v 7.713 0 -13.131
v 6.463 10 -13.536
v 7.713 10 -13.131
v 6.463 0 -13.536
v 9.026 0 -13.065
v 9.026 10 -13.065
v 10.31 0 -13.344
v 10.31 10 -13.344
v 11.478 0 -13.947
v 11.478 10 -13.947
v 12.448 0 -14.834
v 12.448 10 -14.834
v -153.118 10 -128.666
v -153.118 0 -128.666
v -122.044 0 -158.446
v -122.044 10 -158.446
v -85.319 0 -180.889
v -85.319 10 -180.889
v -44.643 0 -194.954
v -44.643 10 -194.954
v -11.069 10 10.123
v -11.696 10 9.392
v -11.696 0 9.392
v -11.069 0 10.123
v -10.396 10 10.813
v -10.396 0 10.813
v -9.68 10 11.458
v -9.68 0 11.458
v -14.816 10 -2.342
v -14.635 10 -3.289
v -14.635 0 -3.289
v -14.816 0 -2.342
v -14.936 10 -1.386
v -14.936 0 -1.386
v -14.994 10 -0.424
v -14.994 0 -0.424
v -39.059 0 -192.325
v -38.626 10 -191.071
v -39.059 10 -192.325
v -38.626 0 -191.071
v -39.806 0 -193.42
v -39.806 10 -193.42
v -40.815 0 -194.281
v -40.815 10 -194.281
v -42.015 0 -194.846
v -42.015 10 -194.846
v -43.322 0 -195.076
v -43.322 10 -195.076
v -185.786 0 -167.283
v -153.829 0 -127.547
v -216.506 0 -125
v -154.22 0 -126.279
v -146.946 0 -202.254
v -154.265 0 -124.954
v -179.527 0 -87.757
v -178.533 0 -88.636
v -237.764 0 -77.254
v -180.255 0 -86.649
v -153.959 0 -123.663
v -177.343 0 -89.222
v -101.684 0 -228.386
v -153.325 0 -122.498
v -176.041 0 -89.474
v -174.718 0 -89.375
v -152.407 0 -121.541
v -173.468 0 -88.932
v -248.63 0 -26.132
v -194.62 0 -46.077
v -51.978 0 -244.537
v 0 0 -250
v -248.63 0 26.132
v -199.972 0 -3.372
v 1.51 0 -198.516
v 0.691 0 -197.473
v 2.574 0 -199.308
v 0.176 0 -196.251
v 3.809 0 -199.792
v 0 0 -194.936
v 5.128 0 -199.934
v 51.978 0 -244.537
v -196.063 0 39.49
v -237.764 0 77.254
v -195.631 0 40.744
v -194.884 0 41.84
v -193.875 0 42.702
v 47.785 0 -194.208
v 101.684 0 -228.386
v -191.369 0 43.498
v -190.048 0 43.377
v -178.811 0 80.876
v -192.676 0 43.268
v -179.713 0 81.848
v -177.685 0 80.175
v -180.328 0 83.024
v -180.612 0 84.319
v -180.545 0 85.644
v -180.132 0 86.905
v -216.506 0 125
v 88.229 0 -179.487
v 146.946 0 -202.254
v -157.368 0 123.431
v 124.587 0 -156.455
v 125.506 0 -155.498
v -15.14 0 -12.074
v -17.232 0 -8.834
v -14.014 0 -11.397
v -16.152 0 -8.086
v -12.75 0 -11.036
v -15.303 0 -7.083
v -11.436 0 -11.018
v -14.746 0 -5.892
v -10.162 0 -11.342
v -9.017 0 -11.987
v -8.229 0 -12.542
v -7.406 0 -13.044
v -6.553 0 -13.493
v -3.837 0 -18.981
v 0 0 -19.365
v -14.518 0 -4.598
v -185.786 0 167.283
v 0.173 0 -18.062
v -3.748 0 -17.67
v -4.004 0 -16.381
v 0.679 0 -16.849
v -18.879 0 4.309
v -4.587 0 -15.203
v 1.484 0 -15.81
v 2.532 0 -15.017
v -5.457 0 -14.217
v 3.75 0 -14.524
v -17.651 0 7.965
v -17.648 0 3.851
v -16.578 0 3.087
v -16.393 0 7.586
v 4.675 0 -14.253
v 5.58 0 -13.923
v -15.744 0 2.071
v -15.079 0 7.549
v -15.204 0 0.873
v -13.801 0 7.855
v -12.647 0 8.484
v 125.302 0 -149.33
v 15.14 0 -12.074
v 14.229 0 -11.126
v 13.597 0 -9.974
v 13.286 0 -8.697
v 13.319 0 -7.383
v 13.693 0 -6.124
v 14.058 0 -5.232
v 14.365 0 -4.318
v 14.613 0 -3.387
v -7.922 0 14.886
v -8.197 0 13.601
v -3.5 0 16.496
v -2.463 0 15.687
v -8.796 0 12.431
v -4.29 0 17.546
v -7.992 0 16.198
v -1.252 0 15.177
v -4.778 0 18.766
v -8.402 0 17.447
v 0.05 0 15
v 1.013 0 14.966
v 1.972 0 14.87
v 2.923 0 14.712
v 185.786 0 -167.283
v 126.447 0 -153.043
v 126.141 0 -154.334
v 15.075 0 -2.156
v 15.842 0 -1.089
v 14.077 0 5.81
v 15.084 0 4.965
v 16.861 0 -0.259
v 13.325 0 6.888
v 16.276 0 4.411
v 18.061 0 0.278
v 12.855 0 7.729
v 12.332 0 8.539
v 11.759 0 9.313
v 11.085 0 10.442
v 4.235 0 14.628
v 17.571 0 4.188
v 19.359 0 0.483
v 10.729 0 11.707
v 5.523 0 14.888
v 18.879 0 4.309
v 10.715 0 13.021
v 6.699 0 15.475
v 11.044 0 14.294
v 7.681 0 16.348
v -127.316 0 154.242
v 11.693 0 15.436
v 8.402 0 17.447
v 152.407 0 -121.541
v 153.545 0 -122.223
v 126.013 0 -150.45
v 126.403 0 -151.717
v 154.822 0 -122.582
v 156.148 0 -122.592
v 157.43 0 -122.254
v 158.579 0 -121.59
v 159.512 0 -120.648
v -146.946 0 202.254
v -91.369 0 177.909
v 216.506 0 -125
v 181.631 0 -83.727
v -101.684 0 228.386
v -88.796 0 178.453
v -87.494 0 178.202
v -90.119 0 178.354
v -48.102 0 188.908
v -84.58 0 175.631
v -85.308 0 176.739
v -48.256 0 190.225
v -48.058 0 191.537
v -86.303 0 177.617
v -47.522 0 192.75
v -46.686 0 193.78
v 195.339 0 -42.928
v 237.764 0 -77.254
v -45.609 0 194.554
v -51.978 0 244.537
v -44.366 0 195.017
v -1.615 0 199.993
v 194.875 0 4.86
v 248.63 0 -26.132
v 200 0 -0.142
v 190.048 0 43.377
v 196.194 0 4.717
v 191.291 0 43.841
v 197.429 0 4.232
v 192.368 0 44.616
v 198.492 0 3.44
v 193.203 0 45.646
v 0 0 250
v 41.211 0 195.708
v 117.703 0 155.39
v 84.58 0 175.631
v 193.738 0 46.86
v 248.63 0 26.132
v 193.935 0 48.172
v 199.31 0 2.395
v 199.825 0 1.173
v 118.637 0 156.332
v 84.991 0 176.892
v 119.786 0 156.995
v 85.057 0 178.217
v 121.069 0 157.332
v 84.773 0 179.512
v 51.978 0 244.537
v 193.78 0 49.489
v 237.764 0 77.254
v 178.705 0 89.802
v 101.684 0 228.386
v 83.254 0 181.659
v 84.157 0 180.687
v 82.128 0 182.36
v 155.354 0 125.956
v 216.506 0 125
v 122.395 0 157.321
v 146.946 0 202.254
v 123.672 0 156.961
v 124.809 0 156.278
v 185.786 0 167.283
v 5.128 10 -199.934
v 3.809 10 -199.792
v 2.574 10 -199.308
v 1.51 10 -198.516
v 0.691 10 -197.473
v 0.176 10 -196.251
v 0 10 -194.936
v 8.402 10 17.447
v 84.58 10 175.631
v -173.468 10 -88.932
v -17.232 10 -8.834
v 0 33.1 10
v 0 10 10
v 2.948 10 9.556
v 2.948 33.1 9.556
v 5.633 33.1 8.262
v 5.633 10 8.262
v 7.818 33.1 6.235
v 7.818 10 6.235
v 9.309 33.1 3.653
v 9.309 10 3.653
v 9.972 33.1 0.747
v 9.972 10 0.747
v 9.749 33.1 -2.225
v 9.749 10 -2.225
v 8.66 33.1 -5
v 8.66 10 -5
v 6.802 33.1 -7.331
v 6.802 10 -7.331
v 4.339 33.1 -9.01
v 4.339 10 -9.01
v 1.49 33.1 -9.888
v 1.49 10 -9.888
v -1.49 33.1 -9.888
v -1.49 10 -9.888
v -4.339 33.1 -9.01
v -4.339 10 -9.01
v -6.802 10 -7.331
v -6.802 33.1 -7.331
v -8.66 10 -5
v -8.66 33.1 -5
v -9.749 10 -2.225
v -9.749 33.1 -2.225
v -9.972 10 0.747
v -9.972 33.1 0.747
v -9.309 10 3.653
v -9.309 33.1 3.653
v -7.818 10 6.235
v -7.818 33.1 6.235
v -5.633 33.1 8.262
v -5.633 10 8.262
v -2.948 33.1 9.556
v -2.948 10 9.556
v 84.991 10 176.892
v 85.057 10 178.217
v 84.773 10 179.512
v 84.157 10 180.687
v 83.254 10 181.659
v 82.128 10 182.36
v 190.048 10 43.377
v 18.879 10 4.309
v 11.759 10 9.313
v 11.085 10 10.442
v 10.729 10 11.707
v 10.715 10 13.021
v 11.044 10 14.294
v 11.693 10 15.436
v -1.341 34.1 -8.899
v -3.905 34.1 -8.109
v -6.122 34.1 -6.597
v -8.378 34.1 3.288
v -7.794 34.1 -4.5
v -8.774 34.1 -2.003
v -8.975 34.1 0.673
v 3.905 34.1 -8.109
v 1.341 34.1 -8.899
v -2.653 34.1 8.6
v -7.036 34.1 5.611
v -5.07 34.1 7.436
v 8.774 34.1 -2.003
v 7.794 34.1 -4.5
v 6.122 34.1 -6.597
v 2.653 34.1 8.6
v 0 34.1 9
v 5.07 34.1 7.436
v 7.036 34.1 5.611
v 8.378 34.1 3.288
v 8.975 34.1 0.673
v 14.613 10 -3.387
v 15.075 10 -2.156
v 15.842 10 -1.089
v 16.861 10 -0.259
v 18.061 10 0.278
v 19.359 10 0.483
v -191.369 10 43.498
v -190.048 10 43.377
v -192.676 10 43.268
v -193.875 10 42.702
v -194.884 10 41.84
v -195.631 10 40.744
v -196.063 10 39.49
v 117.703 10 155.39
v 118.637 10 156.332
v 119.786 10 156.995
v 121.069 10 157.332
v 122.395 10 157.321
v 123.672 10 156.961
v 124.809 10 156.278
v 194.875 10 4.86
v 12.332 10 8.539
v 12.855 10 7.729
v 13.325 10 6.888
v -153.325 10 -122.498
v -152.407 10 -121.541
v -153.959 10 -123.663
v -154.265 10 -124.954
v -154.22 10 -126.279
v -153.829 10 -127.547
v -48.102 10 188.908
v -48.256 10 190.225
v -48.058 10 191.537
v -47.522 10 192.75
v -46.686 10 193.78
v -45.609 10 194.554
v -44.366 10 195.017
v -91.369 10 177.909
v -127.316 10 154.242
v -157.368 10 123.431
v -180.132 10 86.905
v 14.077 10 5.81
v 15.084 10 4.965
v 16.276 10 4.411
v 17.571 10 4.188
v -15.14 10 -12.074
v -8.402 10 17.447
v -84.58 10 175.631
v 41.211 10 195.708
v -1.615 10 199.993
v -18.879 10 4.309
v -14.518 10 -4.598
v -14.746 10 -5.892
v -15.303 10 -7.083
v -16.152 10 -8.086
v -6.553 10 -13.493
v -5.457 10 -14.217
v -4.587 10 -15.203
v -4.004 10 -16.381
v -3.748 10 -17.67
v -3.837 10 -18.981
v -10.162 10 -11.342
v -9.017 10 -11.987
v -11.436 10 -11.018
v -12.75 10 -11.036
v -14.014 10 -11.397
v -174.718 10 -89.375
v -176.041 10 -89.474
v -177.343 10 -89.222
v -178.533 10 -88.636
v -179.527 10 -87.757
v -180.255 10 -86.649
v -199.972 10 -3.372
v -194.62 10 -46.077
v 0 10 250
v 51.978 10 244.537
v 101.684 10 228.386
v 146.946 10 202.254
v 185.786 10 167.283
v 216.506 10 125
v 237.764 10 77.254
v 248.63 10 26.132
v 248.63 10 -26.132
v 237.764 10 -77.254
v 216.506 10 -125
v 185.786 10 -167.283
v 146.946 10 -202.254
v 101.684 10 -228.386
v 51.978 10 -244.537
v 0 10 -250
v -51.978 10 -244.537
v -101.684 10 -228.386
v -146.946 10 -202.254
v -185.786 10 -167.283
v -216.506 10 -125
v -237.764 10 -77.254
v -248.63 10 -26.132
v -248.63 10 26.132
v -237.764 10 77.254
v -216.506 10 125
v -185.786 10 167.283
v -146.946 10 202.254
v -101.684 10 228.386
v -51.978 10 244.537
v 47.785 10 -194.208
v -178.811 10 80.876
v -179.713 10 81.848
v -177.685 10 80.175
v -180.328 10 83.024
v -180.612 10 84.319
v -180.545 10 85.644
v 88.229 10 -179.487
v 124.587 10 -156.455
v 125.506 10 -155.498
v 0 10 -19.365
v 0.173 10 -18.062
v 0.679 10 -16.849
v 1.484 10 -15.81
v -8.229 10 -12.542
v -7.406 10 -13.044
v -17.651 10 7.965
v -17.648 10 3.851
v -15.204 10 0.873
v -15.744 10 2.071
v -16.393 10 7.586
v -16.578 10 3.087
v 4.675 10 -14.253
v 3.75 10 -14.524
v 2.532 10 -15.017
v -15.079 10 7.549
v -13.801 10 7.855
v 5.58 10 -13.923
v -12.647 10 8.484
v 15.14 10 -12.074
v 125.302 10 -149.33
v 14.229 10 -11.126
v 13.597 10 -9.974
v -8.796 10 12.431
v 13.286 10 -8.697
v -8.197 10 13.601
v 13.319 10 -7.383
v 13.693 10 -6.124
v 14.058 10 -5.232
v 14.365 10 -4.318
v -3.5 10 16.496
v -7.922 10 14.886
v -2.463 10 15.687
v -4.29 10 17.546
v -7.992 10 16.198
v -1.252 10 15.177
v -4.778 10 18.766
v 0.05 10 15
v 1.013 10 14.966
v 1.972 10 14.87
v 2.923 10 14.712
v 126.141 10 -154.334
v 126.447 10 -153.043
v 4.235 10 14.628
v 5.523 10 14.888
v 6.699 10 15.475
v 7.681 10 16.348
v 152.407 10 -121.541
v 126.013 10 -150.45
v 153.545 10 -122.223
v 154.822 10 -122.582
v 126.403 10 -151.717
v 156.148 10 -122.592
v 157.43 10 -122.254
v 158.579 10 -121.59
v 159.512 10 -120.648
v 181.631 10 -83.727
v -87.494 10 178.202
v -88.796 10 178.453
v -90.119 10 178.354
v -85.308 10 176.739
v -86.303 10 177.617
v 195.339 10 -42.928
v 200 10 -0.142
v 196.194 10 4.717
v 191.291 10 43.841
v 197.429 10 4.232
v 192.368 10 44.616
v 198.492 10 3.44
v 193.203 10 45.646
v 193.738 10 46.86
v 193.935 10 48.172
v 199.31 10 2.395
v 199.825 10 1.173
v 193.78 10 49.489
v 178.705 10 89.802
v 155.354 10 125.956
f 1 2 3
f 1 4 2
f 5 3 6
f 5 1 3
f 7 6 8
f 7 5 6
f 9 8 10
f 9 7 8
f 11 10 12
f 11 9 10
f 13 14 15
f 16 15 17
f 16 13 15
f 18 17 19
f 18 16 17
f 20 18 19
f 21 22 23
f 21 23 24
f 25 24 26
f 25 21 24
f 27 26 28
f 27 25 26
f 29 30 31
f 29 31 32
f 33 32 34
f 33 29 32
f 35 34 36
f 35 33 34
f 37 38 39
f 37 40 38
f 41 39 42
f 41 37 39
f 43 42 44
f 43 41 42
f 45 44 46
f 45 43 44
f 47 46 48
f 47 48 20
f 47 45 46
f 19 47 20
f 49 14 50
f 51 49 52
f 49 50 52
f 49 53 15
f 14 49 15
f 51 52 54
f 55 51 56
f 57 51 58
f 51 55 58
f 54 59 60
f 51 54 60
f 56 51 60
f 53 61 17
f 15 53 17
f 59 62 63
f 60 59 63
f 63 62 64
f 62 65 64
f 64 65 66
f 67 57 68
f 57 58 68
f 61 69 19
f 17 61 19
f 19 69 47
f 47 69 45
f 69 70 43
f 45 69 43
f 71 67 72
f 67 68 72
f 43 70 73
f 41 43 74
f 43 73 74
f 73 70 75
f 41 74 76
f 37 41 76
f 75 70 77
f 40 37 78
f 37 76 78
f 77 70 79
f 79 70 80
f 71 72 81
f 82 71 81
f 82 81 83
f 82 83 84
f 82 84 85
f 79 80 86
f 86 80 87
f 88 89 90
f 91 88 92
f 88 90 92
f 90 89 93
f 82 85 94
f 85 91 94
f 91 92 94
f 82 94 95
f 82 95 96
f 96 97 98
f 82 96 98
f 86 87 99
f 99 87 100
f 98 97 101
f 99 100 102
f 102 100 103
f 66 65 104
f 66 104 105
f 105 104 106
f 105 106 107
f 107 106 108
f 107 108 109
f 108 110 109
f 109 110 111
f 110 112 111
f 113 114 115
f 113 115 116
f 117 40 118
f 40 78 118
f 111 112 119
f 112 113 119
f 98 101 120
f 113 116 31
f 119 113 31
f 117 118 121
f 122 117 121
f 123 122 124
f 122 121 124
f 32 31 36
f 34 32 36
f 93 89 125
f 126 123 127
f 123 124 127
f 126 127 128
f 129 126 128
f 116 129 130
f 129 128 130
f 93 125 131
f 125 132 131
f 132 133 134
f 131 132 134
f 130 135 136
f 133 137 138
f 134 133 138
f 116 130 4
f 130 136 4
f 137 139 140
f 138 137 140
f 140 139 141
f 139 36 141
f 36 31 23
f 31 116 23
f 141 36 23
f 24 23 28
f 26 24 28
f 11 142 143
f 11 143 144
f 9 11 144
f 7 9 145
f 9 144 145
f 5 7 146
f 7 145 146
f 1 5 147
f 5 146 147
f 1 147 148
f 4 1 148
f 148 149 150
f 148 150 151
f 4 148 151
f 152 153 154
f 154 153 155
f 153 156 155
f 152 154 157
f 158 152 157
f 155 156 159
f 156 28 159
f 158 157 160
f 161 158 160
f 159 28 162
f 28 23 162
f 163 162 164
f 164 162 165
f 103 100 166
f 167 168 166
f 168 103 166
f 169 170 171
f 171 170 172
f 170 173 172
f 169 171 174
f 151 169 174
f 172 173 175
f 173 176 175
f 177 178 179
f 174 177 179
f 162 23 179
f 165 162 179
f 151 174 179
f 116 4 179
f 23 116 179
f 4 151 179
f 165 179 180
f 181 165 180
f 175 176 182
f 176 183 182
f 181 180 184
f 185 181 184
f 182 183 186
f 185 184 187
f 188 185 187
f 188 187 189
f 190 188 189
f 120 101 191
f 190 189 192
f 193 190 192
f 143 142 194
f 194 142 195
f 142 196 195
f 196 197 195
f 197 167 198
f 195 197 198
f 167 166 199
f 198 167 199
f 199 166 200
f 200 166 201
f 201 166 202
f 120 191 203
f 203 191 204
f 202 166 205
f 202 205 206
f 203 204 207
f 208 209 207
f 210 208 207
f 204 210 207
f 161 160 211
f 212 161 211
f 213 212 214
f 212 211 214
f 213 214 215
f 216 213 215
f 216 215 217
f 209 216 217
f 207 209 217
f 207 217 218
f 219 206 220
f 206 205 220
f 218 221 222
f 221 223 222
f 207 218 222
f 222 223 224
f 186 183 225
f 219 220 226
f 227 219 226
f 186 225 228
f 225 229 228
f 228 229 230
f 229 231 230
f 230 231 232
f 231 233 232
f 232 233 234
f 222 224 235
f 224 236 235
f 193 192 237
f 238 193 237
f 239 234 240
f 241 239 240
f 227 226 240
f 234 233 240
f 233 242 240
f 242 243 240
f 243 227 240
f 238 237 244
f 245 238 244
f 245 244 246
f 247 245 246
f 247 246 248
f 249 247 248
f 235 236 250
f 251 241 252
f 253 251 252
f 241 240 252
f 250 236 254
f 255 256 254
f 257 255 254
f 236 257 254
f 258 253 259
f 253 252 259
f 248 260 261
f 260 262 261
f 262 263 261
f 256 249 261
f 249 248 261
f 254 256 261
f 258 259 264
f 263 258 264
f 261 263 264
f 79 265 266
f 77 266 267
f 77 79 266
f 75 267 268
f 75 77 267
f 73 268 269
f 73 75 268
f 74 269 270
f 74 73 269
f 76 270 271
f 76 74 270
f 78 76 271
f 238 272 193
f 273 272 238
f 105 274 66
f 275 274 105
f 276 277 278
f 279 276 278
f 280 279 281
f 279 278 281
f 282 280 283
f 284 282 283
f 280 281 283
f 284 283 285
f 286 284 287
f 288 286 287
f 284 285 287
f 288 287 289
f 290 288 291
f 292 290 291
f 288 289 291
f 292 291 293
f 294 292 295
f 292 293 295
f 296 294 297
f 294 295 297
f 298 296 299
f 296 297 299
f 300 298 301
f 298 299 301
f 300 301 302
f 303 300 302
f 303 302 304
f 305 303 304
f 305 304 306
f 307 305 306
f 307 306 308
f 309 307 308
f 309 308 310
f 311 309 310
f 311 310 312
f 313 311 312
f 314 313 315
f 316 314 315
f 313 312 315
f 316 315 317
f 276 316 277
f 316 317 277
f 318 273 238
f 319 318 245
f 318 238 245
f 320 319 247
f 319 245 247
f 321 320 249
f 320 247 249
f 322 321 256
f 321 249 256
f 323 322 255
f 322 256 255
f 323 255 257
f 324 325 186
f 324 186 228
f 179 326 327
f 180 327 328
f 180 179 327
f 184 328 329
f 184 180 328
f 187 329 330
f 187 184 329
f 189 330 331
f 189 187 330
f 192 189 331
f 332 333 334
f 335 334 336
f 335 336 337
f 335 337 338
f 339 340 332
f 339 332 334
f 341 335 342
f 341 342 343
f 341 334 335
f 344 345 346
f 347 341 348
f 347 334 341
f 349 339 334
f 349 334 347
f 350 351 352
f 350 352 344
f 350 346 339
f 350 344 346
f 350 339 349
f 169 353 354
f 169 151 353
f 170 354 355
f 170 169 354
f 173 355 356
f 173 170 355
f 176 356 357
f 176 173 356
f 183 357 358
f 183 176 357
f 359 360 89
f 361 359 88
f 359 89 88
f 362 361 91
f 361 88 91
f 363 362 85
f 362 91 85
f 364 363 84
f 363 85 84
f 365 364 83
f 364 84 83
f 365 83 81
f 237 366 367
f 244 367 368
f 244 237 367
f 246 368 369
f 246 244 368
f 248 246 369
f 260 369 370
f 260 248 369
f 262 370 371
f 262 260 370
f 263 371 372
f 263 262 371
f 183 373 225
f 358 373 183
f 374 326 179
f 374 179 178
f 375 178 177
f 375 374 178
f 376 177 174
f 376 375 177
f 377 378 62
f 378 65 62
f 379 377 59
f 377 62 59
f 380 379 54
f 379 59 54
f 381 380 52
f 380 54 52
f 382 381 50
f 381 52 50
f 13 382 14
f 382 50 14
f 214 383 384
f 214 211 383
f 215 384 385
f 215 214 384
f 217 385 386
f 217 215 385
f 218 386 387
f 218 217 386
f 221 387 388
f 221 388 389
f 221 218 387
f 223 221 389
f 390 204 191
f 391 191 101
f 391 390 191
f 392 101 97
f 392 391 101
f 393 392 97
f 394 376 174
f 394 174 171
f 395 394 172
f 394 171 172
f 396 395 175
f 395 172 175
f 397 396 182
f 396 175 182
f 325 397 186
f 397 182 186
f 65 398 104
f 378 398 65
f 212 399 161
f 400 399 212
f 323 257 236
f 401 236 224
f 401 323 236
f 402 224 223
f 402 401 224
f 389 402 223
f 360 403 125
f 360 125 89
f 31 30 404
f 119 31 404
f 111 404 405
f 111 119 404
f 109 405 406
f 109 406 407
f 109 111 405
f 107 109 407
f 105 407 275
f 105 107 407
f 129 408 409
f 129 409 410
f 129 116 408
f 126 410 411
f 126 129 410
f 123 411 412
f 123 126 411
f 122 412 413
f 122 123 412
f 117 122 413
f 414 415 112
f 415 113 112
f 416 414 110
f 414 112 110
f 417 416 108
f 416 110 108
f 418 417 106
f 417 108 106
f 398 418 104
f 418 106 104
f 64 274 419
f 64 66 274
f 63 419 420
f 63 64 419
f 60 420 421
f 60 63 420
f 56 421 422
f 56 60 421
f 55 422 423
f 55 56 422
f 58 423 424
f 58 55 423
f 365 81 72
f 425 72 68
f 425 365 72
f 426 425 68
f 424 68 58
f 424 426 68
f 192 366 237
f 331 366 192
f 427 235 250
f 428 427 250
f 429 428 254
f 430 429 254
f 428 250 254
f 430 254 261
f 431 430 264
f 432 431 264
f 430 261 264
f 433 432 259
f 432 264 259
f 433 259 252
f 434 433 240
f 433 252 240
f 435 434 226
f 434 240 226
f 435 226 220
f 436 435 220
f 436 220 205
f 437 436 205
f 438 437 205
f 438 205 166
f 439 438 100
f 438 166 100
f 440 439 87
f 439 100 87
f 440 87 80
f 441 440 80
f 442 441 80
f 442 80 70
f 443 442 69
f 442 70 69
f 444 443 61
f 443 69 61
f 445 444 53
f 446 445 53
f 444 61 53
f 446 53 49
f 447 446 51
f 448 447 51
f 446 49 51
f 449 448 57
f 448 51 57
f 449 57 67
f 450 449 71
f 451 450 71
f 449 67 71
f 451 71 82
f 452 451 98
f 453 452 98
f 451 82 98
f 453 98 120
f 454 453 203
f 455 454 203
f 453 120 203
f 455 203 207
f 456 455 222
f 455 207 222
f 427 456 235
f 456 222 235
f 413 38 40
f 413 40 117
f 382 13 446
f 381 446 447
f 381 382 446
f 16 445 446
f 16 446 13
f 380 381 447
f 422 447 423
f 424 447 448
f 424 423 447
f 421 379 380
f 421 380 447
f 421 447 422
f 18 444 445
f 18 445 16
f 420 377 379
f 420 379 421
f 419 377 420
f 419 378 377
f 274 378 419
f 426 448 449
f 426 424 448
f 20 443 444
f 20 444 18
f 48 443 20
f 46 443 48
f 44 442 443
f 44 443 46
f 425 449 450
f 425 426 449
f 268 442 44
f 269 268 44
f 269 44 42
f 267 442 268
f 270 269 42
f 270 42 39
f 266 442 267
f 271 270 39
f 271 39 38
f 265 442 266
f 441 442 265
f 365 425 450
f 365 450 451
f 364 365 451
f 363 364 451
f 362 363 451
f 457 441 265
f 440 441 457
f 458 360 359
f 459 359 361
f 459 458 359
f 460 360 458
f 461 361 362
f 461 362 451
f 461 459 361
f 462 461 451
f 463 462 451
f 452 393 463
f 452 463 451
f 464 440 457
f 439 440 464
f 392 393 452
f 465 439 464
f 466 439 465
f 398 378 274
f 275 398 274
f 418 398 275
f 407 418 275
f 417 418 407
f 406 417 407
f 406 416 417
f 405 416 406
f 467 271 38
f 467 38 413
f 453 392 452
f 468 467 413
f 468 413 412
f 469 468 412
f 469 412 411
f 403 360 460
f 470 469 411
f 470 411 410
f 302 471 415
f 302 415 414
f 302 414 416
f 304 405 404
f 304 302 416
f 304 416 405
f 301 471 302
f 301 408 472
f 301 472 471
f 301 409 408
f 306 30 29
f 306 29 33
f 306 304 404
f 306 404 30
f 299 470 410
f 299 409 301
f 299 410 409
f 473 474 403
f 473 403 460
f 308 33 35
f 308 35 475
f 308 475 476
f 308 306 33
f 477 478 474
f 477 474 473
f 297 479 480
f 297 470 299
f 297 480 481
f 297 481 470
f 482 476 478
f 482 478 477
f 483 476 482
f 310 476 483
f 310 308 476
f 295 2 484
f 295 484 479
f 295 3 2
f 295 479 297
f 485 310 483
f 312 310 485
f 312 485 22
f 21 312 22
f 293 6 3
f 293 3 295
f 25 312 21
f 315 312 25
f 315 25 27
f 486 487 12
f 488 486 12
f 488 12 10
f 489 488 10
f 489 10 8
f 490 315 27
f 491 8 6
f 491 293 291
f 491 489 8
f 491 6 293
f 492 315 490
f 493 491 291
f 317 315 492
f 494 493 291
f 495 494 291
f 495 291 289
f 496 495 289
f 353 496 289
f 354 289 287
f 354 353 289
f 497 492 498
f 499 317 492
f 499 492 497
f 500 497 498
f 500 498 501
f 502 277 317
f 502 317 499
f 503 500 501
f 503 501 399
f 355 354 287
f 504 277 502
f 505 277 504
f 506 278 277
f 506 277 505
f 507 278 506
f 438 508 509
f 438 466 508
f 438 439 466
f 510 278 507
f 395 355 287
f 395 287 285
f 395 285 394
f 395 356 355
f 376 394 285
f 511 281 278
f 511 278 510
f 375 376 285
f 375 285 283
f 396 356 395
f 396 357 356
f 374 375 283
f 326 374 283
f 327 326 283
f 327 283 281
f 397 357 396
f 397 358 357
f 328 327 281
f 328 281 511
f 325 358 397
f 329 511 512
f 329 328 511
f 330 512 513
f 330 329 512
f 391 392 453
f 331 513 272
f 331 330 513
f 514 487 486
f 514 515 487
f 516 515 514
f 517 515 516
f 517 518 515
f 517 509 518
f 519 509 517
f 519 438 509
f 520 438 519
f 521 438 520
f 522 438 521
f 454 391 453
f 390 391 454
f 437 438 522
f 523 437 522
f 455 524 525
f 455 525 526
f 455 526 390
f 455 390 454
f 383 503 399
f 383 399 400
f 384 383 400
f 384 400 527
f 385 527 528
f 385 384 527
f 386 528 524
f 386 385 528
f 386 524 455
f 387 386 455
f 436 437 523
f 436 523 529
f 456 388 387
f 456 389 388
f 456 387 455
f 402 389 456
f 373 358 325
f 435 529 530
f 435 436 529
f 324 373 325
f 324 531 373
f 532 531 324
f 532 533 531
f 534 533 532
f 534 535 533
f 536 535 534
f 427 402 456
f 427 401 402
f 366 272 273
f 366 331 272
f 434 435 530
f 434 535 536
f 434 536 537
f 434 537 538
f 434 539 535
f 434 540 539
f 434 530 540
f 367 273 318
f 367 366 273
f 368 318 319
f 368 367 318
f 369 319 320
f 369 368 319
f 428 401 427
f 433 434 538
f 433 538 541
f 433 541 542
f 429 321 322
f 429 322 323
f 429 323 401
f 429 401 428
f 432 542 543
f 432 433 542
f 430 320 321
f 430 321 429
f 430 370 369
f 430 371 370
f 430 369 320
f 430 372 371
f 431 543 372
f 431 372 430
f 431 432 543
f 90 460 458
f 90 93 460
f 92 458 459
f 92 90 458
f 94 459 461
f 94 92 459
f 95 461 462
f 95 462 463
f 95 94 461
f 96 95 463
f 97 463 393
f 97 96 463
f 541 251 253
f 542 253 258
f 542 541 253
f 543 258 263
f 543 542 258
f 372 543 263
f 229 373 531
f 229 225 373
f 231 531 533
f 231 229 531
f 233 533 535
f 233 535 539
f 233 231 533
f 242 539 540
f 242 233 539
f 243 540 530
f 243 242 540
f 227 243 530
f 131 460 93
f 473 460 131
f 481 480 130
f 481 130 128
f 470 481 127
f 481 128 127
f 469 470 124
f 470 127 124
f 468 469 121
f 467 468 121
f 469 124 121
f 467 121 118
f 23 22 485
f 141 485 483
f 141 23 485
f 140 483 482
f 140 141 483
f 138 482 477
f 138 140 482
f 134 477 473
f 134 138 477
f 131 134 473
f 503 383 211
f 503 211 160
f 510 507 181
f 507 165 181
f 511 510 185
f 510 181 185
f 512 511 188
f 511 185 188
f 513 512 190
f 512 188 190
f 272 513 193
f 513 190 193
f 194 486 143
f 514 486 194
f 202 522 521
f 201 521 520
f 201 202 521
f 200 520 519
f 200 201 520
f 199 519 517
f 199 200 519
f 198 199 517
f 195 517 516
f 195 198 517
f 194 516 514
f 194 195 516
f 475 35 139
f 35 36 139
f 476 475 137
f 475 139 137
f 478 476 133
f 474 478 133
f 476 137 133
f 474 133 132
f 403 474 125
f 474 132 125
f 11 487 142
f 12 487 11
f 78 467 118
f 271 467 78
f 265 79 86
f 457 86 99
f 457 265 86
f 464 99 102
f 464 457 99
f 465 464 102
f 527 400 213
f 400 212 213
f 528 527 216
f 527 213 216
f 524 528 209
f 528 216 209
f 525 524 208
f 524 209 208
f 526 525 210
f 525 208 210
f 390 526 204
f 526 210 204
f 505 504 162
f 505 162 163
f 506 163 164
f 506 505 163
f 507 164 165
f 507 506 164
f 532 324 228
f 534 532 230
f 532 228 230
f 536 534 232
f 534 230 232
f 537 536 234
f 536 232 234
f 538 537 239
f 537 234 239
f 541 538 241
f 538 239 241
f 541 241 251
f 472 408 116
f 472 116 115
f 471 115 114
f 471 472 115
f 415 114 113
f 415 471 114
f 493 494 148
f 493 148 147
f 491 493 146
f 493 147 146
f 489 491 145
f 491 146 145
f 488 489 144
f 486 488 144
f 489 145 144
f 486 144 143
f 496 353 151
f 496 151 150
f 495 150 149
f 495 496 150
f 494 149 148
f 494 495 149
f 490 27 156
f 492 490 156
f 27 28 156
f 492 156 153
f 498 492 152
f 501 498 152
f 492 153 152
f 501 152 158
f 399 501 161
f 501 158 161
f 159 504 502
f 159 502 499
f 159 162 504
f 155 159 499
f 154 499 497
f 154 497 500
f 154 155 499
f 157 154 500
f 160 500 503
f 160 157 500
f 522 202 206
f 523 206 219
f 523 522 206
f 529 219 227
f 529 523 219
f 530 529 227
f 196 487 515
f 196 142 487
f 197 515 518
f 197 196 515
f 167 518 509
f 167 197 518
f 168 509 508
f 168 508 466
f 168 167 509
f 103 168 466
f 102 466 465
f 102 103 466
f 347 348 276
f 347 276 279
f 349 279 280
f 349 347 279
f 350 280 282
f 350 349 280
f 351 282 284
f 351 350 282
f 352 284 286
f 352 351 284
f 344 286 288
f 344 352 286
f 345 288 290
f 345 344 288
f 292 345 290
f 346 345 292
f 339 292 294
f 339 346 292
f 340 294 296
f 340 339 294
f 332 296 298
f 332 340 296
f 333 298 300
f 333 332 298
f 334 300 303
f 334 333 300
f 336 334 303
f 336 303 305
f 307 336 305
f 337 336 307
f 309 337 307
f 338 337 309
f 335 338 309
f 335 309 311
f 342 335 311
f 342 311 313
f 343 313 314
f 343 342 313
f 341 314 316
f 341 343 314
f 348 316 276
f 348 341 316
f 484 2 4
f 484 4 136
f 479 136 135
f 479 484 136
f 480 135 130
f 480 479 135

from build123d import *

# Parameters (mm, degrees)
SKETCH1_R                = 250
BOSS_EXTRUDE1_DEPTH      = 10
CUT_EXTRUDE1_DEPTH       = 354.694783677
FILLET1_R                = 5
CIRPATTERN1_COUNT        = 7
FILLET1_OF_CIRPATTERN1_R = 5
SKETCH3_R                = 10
BOSS_EXTRUDE2_DEPTH      = 24.1
CHAMFER1_SIZE            = 1


with BuildPart() as part:
    # Sketch1 → Boss-Extrude1 (new body)
    with BuildSketch(Plane(origin=(0, 0, 0), x_dir=(1, 0, 0), z_dir=(0, 1, 0))):
        with Locations(Location((0, 0, 0), (0, 0, 270))):
            Circle(SKETCH1_R)
    extrude(amount=BOSS_EXTRUDE1_DEPTH)

    # Sketch2 → Cut-Extrude1 (cut, through all)
    with BuildSketch(Plane(origin=(0, 10, 0), x_dir=(1, 0, 0), z_dir=(0, 1, 0))):
        with BuildLine():
            Line((0, 15), (0, 200))
            ThreePointArc((0, 200), (68.404028665, 187.938524157), (128.557521937, 153.208888624))
            Line((128.557521937, 153.208888624), (9.641814145, 11.490666647))
            ThreePointArc((9.641814145, 11.490666647), (5.13030215, 14.095389312), (0, 15))
        make_face()
    cut_extrude1 = extrude(amount=-CUT_EXTRUDE1_DEPTH, mode=Mode.SUBTRACT)

    # Fillet1
    fillet1_edges = [part.edges().sort_by_distance(p)[0] for p in [
        (9.641814145, 5, -11.490666647),
        (0, 5, -15),
        (0, 5, -200),
        (128.557521937, 5, -153.208888624),
    ]]
    fillet(fillet1_edges, radius=FILLET1_R)

    # CirPattern1: Cut-Extrude1 ×7 about axis
    cirpattern1_axis = Axis((0, 0, 0), (0, 1, 0))
    for i in range(1, CIRPATTERN1_COUNT):
        add(cut_extrude1.rotate(cirpattern1_axis, i * 360 / CIRPATTERN1_COUNT), mode=Mode.SUBTRACT)

    # Fillet1 of CirPattern1
    fillet1_of_cirpattern1_edges = [part.edges().sort_by_distance(p)[0] for p in [
        (-2.972192148, 5, -14.702587318),
        (-11.727472237, 5, -9.352347028),
        (-156.366296494, 5, -124.697960372),
        (-39.62922864, 5, -196.03449757),
        (-13.348077132, 5, -6.84315986),
        (-14.623918683, 5, 3.337814009),
        (-194.985582436, 5, 44.504186791),
        (-177.974361762, 5, -91.242131471),
        (-13.672587785, 5, 6.169306547),
        (-6.508256087, 5, 13.514533019),
        (-86.776747824, 5, 180.19377358),
        (-182.301170462, 5, 82.257420626),
        (-3.701360965, 5, 14.536159293),
        (6.508256087, 5, 13.514533019),
        (86.776747824, 5, 180.19377358),
        (-49.351479538, 5, 193.815457246),
        (9.057066155, 5, 11.956987608),
        (14.623918683, 5, 3.337814009),
        (194.985582436, 5, 44.504186791),
        (120.760882065, 5, 159.426501445),
        (14.99533773, 5, 0.373960376),
        (11.727472237, 5, -9.352347028),
        (156.366296494, 5, -124.697960372),
        (199.9378364, 5, 4.986138348),
    ]]
    fillet(fillet1_of_cirpattern1_edges, radius=FILLET1_OF_CIRPATTERN1_R)

    # Sketch3 → Boss-Extrude2 (add)
    with BuildSketch(Plane(origin=(0, 10, 0), x_dir=(1, 0, 0), z_dir=(0, 1, 0))):
        with Locations(Location((0, 0, 0), (0, 0, 270))):
            Circle(SKETCH3_R)
    extrude(amount=BOSS_EXTRUDE2_DEPTH)

    # Chamfer1
    chamfer1_edges = [part.edges().sort_by_distance(p)[0] for p in [
        (0, 34.1, -10),
    ]]
    chamfer(chamfer1_edges, length=CHAMFER1_SIZE)


solid = part.part
